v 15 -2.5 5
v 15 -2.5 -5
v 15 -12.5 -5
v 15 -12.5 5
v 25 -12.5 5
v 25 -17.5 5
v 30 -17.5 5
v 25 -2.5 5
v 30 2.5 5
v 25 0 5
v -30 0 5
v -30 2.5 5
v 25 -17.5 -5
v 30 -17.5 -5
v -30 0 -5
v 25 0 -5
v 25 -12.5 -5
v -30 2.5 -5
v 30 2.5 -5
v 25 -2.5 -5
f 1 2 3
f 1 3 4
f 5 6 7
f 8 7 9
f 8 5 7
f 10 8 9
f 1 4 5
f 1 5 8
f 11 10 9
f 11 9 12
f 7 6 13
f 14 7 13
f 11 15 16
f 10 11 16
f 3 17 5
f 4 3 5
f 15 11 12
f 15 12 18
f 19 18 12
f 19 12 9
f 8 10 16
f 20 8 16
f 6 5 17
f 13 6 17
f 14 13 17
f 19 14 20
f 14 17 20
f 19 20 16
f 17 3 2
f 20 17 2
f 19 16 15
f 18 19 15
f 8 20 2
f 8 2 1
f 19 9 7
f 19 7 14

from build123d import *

# Parameters (mm, degrees)
SKETCH_1_W      = 60
SKETCH_1_H      = 10
EXTRUDE_1_DEPTH = 2.5
EXTRUDE_START   = 25
SKETCH_2_W      = 10
SKETCH_2_H      = 20
EXTRUDE_2_DEPTH = 5
SKETCH_5_W      = 10
SKETCH_5_H      = 10
EXTRUDE_3_DEPTH = 10


with BuildPart() as part:
    # 草图1 → 凸台-拉伸1 (new body)
    with BuildSketch(Plane(origin=(0, 0, 0), x_dir=(1, 0, 0), z_dir=(0, 1, 0))):
        Rectangle(SKETCH_1_W, SKETCH_1_H)
    extrude(amount=EXTRUDE_1_DEPTH)

    # 草图2 → 凸台-拉伸2 (add)
    with BuildSketch(Plane(origin=(0, 0, 0), x_dir=(0, 0, -1), z_dir=(1, 0, 0)).offset(EXTRUDE_START)):
        with Locations((0, -7.5)):
            Rectangle(SKETCH_2_W, SKETCH_2_H)
    extrude(amount=EXTRUDE_2_DEPTH)

    # 草图5 → 凸台-拉伸3 (add)
    with BuildSketch(Plane.ZY.offset(-25)):
        with Locations((0, -7.5)):
            Rectangle(SKETCH_5_W, SKETCH_5_H)
    extrude(amount=EXTRUDE_3_DEPTH)


solid = part.part
